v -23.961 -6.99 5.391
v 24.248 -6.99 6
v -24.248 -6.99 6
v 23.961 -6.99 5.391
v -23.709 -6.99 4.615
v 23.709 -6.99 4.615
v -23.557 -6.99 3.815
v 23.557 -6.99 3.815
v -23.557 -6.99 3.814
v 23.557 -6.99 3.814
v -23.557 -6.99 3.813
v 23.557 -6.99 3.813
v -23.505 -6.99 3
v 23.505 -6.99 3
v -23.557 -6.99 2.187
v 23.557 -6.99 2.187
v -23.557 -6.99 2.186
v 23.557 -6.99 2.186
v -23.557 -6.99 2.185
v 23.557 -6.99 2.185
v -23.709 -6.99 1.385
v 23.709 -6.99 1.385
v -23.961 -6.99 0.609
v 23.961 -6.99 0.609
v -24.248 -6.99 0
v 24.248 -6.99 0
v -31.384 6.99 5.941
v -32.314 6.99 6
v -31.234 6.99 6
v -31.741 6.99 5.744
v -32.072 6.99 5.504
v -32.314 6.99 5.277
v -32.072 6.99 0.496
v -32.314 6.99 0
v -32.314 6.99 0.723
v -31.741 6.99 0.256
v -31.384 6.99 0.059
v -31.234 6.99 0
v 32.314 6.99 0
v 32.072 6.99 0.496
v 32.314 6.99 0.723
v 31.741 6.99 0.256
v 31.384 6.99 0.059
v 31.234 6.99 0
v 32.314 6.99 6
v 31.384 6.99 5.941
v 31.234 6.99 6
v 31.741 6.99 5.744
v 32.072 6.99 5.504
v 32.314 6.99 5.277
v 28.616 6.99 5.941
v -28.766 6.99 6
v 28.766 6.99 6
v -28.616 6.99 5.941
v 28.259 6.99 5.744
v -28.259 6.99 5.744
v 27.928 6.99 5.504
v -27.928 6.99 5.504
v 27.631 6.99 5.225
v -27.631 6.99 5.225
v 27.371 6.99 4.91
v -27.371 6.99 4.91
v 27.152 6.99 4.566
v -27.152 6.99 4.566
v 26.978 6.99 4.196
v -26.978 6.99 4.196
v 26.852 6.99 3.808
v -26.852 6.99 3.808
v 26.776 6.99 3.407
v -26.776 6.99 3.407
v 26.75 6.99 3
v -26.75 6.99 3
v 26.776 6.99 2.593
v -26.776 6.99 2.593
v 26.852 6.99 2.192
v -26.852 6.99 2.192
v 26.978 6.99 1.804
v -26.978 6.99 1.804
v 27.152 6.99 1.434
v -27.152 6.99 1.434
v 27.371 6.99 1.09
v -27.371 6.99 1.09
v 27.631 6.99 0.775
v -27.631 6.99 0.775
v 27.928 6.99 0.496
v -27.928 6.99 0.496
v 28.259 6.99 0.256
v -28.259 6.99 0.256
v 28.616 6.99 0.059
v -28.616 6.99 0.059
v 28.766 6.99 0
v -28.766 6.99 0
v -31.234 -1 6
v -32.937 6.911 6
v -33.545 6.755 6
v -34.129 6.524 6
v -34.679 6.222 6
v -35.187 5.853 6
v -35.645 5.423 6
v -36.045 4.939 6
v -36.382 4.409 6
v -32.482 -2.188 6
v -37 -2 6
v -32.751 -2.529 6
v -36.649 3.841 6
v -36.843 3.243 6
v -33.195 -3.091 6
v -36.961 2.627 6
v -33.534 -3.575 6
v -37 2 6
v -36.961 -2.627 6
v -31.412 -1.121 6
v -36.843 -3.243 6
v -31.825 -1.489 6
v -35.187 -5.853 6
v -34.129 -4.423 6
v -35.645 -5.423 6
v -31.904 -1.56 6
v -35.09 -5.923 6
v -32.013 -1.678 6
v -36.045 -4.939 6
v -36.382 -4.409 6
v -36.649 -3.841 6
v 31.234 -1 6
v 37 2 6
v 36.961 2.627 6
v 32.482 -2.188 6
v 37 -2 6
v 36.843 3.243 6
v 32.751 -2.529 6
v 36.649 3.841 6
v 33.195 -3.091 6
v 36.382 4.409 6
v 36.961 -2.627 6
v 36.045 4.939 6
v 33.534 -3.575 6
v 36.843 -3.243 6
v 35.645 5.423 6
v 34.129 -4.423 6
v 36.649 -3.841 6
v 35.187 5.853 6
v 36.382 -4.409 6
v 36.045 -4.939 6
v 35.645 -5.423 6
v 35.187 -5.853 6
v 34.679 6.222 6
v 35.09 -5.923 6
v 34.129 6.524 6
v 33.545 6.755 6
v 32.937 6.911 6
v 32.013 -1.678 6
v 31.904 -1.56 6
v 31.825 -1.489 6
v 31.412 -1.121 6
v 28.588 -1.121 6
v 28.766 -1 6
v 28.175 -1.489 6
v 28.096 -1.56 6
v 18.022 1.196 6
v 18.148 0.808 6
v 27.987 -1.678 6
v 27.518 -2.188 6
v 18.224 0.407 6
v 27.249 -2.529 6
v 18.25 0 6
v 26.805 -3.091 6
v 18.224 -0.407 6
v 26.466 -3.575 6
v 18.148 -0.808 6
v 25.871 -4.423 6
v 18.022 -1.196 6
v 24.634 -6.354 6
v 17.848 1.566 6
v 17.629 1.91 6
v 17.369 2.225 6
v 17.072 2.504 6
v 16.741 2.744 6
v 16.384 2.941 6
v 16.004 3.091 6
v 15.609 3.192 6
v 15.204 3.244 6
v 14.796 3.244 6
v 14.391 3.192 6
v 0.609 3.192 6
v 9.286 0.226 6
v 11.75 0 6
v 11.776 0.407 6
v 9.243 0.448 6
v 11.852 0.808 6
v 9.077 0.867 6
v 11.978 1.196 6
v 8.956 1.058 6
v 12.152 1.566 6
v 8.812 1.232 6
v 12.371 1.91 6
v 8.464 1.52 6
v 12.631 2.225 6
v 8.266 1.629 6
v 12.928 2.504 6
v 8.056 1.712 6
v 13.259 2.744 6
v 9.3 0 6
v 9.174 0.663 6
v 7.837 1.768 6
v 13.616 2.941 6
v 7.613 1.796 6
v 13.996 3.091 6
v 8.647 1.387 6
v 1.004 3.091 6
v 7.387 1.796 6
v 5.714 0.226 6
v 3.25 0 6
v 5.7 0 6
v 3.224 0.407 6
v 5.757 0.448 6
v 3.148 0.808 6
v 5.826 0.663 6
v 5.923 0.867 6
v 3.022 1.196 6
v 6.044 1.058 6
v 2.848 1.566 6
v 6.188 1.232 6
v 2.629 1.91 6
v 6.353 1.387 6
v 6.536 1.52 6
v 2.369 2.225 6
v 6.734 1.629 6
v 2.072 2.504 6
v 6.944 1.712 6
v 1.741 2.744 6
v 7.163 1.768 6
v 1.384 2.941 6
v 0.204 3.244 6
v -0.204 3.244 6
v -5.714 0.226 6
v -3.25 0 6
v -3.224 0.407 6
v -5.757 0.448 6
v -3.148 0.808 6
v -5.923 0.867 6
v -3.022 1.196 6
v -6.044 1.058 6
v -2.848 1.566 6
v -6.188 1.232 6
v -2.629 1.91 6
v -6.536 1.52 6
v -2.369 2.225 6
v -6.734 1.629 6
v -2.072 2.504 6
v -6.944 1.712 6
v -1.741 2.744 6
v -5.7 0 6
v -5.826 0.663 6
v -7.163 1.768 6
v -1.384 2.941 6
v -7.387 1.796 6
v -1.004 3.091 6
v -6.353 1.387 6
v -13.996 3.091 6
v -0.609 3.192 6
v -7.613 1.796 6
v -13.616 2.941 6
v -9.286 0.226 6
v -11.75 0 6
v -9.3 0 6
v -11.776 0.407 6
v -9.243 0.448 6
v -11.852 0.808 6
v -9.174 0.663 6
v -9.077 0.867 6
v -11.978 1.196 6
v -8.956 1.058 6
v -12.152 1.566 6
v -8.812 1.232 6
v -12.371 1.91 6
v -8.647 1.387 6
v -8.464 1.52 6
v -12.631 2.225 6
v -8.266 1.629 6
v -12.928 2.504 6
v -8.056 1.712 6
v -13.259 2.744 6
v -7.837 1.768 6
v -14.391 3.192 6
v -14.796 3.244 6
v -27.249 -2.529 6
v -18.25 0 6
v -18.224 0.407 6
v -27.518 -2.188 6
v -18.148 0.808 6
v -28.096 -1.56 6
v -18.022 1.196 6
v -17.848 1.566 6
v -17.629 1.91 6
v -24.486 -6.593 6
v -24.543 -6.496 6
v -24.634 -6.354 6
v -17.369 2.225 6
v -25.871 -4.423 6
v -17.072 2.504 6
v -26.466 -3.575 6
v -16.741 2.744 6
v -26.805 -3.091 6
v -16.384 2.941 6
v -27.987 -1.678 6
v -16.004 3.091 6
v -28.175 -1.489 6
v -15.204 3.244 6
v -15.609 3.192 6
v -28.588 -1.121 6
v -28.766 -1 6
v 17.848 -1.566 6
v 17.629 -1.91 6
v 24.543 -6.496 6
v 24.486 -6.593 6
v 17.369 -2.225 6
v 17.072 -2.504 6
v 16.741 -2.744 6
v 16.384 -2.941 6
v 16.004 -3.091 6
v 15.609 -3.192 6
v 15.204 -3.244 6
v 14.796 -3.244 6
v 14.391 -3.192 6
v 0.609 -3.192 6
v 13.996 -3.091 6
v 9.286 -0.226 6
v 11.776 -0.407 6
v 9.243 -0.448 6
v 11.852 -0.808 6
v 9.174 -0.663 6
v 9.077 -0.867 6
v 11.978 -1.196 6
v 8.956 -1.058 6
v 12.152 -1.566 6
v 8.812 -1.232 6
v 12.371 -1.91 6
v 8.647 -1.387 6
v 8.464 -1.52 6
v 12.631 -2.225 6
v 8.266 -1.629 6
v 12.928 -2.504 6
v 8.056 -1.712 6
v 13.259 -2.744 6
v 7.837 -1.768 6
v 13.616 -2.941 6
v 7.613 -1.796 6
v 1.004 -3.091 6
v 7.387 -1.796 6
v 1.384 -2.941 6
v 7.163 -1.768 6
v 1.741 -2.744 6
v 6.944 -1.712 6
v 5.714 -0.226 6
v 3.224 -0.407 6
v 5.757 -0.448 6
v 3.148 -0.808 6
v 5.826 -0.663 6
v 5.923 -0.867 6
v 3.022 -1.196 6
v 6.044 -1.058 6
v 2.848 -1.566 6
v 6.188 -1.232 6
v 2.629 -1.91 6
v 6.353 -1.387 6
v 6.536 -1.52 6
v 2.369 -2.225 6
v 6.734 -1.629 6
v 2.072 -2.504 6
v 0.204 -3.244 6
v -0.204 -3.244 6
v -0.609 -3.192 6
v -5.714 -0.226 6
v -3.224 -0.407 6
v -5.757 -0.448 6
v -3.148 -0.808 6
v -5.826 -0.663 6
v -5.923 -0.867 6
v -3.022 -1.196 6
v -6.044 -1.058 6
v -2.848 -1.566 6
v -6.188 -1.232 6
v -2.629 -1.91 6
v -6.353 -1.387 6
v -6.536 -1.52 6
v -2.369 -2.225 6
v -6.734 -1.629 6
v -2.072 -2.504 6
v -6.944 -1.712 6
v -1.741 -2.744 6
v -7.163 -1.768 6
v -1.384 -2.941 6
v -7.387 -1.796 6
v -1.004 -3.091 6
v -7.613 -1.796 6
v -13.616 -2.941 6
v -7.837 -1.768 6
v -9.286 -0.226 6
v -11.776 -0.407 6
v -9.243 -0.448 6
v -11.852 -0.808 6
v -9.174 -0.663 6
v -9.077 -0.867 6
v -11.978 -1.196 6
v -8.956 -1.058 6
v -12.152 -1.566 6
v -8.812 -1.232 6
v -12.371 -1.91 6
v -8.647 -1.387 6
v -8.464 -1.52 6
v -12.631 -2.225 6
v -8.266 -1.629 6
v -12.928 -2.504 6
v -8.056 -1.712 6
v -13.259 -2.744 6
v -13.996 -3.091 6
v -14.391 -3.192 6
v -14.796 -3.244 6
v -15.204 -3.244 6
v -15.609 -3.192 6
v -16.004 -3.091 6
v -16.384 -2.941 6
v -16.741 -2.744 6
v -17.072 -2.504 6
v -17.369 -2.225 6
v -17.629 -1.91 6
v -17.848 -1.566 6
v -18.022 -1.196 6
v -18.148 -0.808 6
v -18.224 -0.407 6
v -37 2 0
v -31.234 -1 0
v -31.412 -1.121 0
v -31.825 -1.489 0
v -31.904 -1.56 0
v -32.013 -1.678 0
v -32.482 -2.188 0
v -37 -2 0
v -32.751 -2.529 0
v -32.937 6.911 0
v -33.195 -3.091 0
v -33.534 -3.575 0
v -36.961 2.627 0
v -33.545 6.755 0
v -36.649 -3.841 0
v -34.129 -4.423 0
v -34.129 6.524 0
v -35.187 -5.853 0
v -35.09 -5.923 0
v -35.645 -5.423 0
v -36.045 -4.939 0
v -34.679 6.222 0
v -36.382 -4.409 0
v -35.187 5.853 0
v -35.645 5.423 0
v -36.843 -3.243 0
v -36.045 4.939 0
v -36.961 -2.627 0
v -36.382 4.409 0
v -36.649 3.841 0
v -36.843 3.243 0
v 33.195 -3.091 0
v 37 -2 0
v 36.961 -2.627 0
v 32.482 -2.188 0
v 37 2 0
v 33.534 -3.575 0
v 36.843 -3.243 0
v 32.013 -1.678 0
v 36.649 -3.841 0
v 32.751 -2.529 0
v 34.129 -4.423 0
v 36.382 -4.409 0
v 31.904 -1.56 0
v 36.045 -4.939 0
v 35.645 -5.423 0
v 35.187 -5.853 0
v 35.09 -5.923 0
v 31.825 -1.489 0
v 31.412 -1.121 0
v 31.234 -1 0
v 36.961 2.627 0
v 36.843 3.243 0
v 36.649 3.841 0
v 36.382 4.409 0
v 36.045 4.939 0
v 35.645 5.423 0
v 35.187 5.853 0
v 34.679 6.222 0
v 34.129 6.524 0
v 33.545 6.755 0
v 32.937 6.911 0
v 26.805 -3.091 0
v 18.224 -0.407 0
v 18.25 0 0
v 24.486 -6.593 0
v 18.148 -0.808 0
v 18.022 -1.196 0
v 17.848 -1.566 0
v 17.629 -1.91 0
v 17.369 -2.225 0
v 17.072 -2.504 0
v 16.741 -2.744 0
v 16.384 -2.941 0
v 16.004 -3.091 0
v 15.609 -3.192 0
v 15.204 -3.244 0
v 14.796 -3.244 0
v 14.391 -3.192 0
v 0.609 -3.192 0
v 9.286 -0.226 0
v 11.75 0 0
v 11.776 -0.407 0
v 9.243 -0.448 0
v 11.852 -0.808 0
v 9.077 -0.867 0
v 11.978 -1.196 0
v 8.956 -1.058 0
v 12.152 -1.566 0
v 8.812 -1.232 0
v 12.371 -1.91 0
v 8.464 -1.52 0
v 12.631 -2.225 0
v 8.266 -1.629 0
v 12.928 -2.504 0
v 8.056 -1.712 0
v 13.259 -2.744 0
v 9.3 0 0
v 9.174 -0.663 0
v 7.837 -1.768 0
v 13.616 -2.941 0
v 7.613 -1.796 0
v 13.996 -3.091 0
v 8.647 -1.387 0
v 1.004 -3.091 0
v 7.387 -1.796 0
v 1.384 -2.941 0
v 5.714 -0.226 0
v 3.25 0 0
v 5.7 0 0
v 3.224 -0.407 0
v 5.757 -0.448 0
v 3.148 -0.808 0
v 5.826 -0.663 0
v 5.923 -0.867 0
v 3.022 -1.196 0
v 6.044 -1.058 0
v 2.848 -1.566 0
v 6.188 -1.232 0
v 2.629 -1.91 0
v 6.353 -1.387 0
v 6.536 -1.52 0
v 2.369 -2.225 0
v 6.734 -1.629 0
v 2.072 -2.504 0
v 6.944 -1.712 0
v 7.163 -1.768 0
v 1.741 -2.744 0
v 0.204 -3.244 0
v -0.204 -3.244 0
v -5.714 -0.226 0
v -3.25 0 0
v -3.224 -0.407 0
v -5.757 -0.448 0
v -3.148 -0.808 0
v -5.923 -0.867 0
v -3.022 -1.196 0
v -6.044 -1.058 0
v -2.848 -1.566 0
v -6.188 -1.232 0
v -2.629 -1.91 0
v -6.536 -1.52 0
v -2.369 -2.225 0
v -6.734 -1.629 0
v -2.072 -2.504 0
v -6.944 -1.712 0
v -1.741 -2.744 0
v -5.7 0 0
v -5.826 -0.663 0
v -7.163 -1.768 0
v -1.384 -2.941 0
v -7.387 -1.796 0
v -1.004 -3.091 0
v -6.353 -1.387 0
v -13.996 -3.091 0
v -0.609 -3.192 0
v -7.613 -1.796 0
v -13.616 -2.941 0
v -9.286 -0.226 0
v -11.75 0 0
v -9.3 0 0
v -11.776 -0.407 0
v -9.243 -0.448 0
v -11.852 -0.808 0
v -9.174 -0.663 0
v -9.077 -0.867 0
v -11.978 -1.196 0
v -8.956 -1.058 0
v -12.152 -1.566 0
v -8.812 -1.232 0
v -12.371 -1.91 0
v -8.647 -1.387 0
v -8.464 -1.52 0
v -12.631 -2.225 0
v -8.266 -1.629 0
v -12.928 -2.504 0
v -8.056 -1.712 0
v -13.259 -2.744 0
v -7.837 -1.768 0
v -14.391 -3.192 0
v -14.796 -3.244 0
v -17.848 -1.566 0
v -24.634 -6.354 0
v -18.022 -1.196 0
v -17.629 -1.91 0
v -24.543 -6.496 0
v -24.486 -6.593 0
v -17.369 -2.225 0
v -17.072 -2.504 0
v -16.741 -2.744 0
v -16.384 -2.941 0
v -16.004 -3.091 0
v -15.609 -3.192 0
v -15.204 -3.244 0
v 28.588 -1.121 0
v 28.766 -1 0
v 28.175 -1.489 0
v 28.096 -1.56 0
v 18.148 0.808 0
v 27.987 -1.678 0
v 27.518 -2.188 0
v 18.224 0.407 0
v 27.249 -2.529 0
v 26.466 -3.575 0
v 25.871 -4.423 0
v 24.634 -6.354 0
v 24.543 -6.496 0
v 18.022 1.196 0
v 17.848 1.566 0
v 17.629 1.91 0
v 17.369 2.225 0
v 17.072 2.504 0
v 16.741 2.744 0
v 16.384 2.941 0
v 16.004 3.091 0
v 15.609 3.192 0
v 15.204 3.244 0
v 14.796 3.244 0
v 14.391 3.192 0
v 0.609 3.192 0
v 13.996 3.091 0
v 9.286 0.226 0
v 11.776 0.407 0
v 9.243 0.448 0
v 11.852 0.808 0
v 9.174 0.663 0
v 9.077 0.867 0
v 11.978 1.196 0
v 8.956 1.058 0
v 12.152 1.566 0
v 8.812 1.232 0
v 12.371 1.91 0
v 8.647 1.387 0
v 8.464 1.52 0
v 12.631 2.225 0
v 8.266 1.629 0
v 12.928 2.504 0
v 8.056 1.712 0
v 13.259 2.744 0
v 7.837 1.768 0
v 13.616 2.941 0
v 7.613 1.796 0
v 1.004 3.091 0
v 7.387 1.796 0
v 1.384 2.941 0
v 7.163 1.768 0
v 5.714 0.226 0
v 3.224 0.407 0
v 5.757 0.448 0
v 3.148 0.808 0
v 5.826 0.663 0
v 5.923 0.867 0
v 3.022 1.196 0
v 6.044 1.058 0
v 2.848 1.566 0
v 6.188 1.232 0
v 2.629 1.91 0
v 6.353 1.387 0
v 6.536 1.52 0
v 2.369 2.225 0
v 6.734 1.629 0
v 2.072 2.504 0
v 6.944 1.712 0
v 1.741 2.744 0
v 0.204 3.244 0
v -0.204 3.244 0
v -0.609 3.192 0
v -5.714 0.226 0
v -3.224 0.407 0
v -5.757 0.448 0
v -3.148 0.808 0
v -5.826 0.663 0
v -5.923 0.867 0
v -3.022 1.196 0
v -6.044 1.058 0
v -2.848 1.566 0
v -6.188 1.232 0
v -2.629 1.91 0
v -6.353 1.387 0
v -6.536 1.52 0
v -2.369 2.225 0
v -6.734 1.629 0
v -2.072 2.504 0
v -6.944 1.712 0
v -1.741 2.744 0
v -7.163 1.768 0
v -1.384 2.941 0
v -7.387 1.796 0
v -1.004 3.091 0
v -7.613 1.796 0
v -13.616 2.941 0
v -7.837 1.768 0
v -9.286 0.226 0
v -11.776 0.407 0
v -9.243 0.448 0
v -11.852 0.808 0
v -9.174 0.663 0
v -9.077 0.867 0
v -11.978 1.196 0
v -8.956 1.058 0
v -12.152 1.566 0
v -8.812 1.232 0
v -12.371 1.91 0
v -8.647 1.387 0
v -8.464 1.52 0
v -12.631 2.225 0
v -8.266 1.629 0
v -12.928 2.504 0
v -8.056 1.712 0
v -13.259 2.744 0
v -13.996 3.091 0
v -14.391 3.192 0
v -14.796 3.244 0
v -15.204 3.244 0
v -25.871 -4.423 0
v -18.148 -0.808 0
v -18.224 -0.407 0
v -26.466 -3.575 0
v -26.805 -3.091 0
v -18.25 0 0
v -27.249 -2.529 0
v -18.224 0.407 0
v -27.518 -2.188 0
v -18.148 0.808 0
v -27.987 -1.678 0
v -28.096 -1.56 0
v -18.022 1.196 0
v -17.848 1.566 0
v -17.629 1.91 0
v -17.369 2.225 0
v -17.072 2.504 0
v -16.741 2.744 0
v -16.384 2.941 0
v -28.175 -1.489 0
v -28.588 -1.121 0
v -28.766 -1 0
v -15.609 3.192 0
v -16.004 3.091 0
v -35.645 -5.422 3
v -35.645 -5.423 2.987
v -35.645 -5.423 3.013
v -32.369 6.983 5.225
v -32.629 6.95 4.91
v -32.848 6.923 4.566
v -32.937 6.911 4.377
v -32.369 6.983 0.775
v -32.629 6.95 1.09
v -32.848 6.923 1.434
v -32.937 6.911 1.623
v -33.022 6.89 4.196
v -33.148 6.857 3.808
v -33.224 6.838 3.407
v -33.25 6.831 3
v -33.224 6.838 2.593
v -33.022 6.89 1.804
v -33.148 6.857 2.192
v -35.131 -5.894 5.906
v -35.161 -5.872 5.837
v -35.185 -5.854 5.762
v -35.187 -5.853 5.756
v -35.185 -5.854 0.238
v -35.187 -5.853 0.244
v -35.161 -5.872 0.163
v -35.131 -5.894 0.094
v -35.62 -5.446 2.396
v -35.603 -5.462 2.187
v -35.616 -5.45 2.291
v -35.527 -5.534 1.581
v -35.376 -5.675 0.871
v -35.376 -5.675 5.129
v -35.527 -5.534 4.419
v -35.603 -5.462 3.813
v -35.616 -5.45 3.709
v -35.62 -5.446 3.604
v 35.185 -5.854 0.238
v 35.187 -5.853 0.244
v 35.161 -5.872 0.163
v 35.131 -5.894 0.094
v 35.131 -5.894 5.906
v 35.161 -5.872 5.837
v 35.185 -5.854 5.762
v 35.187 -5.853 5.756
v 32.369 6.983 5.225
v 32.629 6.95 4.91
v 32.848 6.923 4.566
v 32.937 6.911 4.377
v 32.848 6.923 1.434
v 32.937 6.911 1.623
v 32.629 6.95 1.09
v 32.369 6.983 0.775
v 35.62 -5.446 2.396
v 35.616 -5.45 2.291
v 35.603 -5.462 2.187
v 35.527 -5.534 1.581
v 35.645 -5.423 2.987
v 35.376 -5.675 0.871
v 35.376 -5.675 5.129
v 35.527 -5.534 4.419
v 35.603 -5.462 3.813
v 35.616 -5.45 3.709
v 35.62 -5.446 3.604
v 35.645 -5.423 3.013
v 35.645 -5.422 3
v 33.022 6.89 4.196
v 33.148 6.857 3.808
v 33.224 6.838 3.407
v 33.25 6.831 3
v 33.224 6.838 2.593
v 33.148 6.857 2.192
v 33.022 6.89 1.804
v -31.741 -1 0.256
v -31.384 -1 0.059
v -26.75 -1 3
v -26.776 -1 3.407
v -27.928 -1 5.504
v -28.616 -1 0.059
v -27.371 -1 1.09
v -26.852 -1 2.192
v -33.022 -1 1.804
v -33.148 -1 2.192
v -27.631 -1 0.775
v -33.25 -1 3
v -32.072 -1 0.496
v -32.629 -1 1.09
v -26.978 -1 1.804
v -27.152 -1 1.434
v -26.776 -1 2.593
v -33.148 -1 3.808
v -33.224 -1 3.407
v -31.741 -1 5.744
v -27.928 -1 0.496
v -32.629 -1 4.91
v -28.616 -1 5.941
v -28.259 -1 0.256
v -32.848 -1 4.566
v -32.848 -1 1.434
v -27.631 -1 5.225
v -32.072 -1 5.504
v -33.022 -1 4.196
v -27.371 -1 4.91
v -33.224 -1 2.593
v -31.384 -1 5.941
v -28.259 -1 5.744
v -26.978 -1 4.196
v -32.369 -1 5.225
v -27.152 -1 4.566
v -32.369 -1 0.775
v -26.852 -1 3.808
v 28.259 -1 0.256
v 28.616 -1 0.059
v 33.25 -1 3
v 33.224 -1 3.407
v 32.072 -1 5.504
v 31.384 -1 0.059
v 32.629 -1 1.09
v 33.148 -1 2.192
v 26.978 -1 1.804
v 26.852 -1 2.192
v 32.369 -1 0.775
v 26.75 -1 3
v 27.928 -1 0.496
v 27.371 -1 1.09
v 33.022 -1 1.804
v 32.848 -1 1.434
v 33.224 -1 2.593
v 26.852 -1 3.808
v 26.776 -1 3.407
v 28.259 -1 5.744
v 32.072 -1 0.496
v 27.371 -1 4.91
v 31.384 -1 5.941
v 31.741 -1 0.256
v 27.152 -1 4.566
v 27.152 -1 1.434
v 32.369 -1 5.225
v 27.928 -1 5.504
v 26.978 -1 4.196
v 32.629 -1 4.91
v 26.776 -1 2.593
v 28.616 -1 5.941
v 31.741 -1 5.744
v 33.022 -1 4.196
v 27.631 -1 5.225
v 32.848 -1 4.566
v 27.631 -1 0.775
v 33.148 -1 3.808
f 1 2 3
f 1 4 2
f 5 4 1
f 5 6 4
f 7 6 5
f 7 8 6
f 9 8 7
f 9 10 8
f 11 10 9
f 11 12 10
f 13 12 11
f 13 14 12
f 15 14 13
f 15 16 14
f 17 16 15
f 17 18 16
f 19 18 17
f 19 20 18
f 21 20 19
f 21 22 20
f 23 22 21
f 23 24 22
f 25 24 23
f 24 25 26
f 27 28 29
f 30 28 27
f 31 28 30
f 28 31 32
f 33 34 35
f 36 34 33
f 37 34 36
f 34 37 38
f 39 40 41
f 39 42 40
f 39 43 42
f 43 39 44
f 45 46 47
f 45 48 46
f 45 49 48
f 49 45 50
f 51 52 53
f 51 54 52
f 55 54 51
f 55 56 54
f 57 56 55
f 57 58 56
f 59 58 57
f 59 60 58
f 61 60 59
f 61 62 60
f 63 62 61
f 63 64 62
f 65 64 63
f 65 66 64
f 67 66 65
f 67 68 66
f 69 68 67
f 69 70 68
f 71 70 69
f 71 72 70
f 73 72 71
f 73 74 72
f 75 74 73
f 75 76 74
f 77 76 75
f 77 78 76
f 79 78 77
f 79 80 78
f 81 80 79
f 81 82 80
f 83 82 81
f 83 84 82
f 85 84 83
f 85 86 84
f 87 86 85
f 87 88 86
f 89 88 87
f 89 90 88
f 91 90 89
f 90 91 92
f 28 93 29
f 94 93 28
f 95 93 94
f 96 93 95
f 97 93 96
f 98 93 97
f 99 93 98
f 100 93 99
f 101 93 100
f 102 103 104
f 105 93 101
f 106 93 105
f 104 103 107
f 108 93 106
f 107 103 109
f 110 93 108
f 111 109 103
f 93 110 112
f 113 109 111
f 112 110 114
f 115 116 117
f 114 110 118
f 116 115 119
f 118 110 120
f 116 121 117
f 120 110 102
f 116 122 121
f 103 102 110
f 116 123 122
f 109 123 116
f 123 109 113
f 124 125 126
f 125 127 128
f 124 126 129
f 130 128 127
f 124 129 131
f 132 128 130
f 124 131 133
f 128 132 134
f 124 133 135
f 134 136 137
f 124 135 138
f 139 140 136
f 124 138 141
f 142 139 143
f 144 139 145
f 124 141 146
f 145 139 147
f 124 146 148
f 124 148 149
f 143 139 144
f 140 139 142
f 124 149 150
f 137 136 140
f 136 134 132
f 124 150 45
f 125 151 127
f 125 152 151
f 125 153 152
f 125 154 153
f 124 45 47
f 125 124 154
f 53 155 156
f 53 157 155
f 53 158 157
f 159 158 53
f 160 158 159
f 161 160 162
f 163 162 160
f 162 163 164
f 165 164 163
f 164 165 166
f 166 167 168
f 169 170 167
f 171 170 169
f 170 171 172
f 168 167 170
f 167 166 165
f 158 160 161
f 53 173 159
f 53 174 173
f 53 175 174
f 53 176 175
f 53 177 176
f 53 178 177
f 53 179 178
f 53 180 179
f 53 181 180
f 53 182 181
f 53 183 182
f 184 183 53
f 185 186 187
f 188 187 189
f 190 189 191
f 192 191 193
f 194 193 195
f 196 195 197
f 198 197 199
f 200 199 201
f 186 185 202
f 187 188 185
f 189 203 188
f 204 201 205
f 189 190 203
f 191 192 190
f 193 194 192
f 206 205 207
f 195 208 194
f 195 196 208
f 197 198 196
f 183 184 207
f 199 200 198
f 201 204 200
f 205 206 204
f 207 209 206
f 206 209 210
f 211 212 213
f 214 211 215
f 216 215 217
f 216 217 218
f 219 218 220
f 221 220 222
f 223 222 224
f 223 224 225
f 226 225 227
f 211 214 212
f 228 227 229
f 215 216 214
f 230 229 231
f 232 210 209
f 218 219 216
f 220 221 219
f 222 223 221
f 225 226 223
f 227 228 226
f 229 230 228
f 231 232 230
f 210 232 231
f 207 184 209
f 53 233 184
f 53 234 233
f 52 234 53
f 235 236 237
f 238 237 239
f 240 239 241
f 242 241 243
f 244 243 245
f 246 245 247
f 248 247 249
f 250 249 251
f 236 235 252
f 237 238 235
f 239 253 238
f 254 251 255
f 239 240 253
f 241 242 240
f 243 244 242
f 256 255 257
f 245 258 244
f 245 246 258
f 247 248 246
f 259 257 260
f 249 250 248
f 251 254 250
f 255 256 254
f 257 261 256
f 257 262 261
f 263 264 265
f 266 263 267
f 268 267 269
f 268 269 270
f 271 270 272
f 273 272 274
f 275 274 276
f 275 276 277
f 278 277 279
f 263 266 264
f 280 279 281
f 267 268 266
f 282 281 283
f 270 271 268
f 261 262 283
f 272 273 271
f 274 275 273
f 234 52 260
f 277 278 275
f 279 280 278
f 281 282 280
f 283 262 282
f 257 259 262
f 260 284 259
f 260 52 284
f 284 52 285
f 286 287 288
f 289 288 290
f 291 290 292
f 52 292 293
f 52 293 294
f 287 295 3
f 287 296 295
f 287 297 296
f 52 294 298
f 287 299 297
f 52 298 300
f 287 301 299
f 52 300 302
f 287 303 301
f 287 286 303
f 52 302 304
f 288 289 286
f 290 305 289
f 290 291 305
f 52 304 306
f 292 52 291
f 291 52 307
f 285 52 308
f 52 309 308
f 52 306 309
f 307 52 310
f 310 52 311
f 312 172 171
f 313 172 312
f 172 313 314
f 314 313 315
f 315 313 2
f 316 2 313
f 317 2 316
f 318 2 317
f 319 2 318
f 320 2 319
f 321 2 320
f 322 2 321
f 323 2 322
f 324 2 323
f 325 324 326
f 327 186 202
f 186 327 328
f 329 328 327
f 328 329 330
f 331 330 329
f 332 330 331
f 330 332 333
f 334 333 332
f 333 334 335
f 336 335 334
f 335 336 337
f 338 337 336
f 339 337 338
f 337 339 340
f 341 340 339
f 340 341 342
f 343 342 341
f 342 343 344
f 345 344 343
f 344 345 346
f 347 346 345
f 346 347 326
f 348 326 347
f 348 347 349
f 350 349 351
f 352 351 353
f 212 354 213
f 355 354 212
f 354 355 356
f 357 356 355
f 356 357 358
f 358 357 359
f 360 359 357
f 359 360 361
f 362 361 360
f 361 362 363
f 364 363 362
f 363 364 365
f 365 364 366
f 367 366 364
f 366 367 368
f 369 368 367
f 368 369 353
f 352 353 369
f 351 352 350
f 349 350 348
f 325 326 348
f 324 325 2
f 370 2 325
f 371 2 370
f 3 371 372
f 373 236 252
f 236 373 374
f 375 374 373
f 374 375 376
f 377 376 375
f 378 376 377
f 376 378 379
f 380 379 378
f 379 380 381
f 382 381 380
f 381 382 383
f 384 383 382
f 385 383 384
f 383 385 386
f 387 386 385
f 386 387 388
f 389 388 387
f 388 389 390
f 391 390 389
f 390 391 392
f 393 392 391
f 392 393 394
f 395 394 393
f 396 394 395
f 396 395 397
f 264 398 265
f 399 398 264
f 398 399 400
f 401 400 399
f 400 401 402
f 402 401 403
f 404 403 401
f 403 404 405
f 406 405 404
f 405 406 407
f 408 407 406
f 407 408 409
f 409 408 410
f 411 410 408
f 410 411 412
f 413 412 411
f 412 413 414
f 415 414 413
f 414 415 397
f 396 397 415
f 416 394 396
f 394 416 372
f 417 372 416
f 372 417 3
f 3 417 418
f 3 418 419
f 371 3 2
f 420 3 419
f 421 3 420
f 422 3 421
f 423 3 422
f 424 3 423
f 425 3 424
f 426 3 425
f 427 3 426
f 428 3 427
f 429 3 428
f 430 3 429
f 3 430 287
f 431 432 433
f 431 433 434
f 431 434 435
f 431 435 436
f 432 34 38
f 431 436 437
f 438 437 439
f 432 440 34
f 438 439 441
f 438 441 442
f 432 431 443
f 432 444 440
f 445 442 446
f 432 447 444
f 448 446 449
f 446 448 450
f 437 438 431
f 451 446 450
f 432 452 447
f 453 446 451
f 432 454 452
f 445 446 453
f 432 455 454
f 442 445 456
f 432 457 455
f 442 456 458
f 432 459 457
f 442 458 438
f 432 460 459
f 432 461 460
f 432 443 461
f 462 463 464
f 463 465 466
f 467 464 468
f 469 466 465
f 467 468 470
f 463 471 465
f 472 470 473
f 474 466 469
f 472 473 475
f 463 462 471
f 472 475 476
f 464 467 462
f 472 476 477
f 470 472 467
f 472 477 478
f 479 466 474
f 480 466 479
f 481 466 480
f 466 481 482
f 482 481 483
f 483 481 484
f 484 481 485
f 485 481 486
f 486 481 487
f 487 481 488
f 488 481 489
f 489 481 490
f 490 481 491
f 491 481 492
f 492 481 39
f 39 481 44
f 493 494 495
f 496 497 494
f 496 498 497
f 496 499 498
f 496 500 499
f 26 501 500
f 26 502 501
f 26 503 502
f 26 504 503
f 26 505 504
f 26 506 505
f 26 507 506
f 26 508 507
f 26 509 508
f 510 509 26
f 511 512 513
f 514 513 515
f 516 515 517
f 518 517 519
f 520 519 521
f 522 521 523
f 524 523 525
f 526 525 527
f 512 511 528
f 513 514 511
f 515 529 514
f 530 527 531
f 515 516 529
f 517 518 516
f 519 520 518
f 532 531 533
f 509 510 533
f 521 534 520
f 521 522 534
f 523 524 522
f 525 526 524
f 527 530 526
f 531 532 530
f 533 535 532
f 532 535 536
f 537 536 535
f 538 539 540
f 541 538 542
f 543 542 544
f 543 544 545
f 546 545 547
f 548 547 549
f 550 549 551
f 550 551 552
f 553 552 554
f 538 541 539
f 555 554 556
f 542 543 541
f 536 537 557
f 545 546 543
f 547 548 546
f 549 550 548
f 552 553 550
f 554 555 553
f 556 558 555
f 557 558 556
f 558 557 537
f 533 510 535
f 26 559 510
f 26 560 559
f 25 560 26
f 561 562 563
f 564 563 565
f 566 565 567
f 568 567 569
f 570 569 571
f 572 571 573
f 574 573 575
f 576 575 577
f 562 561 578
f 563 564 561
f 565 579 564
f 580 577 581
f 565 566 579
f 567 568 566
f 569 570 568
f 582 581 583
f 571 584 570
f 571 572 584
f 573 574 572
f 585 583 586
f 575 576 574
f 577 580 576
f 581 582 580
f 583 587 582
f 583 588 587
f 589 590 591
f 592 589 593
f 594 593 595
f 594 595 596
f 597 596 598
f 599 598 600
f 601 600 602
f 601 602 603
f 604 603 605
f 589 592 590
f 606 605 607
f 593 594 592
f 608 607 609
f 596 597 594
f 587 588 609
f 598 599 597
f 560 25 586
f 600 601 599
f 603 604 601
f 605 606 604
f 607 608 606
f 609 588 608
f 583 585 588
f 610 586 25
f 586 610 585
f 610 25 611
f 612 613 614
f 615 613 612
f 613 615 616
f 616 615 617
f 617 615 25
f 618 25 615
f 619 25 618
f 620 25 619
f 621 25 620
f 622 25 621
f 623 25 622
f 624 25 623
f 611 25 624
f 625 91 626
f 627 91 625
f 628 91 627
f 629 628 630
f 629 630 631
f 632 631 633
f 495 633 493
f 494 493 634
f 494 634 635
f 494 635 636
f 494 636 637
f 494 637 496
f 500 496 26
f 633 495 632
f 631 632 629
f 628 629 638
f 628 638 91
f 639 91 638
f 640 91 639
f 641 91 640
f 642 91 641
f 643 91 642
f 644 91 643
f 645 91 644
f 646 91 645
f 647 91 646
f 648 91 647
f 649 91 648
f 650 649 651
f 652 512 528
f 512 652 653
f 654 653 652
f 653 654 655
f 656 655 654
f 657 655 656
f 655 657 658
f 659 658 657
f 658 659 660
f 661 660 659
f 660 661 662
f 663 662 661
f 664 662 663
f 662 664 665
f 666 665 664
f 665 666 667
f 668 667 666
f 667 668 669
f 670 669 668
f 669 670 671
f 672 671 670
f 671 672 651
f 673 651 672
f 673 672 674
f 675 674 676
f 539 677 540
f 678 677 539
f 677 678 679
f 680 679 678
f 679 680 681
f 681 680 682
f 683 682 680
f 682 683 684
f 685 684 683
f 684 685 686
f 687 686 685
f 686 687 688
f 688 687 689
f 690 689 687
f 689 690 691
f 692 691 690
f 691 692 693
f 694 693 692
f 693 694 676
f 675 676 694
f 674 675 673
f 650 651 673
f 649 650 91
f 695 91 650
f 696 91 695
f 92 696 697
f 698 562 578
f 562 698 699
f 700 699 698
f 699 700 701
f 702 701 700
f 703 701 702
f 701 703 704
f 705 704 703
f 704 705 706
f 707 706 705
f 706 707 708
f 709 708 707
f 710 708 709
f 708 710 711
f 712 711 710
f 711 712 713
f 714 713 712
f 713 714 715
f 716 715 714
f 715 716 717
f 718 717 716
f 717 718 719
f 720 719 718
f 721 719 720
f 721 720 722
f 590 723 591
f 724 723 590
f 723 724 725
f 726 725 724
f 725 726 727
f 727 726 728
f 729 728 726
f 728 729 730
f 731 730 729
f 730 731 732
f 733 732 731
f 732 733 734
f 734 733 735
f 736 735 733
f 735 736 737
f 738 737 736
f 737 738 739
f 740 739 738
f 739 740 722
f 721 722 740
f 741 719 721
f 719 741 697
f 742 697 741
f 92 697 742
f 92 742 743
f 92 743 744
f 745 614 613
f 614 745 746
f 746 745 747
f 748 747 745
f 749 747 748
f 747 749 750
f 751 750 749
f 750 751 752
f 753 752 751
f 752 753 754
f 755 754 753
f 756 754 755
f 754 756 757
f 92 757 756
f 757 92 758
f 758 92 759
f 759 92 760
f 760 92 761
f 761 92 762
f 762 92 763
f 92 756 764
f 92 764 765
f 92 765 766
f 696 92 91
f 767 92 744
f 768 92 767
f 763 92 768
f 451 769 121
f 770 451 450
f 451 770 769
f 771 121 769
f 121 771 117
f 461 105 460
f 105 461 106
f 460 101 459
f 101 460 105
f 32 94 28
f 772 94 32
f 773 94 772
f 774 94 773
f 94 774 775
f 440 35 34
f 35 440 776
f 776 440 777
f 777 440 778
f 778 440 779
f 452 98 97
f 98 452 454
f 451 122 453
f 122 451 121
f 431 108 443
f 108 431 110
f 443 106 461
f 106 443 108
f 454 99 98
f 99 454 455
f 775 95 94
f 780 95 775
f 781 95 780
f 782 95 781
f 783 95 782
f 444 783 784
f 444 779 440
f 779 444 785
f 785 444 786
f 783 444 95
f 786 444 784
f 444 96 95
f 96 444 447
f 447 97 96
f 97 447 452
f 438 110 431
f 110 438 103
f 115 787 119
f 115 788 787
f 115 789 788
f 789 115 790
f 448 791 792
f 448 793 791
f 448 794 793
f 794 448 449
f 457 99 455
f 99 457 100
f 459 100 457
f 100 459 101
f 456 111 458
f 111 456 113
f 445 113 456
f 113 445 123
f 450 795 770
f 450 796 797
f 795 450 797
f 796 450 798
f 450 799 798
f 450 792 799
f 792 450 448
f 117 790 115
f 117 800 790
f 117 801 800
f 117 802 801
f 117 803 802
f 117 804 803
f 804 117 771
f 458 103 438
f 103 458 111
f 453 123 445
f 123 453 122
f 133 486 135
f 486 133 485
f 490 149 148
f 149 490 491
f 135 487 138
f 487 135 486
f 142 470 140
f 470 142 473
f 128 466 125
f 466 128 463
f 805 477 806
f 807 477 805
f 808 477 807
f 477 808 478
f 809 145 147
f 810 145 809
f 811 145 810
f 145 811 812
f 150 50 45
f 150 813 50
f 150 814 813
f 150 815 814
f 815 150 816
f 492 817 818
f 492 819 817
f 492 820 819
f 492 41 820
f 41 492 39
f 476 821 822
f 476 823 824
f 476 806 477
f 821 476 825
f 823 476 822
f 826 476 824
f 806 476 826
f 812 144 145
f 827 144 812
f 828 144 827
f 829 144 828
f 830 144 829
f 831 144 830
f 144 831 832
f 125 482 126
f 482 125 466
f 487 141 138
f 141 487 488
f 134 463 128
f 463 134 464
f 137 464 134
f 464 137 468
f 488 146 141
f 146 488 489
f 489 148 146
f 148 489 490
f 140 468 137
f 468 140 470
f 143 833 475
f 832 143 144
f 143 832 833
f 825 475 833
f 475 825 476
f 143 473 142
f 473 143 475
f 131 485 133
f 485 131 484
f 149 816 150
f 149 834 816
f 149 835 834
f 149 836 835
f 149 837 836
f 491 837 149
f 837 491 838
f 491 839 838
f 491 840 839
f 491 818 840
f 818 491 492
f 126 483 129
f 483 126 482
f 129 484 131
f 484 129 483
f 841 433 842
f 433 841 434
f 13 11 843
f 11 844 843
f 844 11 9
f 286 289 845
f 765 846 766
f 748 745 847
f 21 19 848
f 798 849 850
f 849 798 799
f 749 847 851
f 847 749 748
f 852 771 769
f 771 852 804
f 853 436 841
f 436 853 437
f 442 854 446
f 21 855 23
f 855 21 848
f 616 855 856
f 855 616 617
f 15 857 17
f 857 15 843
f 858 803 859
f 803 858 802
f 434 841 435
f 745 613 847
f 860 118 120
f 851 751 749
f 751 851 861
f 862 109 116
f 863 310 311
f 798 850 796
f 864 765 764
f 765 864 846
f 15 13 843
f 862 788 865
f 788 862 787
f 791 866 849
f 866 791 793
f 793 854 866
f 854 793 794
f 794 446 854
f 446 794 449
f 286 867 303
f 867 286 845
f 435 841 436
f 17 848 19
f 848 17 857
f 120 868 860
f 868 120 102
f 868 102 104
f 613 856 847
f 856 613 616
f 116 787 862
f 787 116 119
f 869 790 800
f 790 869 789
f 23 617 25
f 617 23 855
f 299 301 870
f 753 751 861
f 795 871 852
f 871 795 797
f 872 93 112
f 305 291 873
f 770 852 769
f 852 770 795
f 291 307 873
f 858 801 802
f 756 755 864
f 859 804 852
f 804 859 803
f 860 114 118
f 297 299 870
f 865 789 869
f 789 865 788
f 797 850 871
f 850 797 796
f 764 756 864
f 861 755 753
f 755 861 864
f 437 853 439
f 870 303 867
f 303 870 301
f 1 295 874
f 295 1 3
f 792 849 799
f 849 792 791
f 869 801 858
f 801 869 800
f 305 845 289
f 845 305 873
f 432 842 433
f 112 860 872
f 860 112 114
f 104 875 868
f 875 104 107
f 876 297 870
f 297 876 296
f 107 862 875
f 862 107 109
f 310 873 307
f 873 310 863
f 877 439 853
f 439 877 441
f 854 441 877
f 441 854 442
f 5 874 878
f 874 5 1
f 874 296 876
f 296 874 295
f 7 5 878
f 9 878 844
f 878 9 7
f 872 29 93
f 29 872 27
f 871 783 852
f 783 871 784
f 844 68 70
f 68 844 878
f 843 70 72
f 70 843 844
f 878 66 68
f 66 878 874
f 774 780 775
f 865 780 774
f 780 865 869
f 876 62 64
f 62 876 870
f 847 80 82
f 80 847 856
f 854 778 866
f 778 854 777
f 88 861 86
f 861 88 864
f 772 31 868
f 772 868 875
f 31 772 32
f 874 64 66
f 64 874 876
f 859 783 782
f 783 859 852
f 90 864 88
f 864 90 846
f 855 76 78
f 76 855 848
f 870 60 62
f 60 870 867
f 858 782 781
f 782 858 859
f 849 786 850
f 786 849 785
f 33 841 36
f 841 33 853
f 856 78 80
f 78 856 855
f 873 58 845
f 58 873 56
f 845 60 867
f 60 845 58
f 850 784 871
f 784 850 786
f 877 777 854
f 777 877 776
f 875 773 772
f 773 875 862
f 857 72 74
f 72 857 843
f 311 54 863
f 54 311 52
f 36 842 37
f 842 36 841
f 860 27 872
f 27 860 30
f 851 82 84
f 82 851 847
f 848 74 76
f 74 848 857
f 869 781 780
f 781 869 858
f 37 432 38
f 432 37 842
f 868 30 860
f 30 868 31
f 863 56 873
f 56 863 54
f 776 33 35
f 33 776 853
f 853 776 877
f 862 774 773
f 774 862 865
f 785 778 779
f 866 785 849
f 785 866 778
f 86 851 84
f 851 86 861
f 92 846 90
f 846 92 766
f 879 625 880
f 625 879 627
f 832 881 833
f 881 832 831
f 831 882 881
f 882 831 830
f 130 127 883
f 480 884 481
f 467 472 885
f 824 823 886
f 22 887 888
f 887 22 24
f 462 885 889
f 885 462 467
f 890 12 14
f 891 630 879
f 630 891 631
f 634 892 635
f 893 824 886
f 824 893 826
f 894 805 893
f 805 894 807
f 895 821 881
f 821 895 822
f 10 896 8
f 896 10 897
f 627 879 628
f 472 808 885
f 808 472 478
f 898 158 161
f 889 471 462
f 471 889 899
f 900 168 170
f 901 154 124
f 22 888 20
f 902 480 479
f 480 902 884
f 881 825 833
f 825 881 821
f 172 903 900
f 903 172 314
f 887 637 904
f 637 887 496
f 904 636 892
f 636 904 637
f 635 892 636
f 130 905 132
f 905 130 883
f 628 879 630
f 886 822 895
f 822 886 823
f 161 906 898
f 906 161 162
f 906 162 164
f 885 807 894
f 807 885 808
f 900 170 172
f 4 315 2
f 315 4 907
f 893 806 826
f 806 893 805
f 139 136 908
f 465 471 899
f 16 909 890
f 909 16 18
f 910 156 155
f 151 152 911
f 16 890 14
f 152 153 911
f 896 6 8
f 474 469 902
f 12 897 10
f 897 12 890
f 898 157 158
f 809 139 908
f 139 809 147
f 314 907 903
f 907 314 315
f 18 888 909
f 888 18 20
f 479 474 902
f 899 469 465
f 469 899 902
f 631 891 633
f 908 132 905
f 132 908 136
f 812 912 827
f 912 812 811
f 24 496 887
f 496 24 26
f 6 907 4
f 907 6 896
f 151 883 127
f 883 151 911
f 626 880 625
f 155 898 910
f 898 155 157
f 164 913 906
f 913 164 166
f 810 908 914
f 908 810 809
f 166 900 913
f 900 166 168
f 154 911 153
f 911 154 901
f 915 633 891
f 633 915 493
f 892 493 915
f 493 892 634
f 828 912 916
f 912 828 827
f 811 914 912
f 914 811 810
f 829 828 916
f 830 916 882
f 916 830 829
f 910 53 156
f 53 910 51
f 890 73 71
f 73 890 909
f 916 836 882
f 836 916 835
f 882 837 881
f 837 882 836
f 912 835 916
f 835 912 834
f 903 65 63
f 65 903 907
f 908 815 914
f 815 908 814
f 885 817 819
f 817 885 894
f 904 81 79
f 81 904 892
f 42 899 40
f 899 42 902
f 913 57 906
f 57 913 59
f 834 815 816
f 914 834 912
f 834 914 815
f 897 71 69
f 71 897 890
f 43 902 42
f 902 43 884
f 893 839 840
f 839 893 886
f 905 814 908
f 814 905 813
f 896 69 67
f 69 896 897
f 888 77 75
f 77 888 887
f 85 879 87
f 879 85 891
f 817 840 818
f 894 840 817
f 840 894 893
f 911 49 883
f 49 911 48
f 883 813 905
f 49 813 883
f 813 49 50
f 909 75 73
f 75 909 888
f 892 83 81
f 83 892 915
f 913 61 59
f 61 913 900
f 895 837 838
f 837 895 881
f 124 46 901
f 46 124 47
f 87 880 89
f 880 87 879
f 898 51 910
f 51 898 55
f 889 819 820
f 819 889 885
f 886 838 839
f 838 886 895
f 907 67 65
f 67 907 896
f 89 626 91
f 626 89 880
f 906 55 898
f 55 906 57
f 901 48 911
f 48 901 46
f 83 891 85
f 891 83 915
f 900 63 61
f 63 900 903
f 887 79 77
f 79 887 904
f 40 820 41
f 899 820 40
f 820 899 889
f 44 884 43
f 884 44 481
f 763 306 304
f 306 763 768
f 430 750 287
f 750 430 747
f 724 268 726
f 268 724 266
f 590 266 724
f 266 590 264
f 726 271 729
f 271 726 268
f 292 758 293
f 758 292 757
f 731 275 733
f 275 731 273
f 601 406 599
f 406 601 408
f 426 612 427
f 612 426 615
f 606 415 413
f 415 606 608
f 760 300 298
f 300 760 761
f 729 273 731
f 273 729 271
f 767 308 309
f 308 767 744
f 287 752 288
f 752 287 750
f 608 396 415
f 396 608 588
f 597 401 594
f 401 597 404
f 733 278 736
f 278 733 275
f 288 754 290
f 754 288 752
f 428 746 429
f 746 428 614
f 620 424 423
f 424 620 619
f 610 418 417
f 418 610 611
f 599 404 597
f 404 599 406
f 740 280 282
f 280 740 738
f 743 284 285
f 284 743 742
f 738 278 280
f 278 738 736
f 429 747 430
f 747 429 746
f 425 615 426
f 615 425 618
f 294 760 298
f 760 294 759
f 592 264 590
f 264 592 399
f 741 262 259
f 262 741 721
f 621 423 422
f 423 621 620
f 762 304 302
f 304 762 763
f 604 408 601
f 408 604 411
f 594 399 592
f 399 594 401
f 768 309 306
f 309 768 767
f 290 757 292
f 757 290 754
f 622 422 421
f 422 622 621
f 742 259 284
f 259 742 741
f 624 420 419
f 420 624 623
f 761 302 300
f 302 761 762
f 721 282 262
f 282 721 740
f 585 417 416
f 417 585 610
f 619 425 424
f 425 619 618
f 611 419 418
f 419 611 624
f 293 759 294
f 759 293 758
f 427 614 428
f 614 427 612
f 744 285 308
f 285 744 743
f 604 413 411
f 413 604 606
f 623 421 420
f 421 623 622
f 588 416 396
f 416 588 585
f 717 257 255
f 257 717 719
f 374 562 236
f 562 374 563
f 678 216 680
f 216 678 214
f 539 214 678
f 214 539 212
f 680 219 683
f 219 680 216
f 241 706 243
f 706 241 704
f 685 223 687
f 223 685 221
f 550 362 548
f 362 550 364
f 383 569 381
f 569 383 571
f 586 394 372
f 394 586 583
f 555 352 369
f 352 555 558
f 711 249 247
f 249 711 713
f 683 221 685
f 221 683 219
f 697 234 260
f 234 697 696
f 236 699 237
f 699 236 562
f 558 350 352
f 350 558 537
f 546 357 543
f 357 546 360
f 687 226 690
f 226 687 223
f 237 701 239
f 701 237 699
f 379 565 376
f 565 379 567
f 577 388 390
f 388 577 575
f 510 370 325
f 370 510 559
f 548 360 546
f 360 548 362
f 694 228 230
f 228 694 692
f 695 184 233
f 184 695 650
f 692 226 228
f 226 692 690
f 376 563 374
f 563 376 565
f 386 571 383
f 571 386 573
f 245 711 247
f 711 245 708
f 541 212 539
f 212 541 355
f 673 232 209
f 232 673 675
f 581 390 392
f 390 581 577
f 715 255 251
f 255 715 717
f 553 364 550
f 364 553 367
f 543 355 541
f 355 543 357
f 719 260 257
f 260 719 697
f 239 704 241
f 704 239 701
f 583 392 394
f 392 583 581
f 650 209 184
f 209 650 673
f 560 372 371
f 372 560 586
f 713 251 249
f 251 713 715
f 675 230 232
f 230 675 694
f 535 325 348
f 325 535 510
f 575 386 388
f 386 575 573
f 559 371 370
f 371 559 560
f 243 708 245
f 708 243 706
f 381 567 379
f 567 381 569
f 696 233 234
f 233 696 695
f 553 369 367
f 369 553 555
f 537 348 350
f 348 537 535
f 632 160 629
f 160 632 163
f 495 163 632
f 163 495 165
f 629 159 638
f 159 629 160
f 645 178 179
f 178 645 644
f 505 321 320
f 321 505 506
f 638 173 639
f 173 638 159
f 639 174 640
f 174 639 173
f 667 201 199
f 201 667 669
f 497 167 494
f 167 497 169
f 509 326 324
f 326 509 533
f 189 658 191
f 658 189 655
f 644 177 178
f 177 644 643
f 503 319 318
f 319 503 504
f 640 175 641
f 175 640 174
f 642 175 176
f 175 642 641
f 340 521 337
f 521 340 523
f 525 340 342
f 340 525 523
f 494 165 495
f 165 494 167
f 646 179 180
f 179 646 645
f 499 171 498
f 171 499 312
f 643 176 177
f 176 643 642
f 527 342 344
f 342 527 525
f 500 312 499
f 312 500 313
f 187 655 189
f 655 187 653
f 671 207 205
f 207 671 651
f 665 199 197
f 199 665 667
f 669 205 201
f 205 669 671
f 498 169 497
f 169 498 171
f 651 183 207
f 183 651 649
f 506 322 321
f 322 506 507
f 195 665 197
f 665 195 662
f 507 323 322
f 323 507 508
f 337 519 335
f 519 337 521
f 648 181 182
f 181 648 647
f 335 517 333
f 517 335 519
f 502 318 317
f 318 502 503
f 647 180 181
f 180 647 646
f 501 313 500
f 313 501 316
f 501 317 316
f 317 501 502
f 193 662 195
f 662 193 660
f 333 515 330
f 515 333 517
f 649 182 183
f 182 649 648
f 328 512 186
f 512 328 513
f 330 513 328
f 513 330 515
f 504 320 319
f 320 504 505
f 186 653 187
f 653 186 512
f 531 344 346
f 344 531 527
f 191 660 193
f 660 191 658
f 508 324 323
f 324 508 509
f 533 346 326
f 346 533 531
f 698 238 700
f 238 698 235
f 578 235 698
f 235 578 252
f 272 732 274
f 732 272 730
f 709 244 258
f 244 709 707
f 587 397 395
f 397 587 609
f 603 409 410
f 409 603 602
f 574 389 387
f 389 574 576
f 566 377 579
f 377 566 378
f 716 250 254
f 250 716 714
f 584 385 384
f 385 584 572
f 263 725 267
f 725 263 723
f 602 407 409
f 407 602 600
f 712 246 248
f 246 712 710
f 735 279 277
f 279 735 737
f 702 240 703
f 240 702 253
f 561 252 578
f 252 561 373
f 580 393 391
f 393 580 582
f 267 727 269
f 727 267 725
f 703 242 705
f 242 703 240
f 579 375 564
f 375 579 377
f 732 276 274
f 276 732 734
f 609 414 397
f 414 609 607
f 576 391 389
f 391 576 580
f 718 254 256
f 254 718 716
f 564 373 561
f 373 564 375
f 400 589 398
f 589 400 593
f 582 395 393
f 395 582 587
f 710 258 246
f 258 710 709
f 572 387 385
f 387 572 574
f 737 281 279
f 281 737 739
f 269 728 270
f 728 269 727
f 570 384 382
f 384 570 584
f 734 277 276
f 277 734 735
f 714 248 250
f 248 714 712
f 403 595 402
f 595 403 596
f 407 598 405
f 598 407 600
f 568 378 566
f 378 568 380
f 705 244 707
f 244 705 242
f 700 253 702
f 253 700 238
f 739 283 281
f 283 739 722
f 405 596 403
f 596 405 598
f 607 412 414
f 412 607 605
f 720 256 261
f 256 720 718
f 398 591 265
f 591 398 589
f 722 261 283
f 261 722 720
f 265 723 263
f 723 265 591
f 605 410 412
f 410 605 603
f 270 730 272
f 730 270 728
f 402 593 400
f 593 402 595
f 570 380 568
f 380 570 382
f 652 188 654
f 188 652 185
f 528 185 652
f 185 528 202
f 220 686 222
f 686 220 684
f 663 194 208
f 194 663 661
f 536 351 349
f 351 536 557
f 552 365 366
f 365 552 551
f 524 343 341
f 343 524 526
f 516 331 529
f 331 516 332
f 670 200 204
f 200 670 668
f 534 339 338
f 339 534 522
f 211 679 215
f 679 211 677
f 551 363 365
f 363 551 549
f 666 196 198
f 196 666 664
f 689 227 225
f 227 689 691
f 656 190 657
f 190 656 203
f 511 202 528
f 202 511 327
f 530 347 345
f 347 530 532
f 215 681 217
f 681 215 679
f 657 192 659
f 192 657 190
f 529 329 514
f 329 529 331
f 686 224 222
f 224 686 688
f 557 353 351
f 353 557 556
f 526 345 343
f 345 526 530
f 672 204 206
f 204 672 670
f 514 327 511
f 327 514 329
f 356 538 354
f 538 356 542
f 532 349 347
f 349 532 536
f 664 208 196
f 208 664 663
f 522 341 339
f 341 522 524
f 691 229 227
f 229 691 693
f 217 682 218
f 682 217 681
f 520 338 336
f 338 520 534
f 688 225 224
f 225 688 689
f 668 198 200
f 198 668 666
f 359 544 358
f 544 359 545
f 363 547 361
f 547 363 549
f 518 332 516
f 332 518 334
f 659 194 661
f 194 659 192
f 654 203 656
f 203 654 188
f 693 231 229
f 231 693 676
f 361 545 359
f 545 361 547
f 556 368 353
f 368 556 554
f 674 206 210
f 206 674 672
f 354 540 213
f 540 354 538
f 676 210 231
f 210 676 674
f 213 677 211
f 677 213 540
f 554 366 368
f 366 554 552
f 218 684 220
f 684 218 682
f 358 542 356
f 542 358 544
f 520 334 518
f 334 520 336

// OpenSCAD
$fn = 50;


difference() {
	union() {
		hull() {
			translate(v = [-17.0000000000, 2.0000000000, 0]) {
				cylinder(h = 6, r = 5);
			}
			translate(v = [17.0000000000, 2.0000000000, 0]) {
				cylinder(h = 6, r = 5);
			}
			translate(v = [-17.0000000000, -2.0000000000, 0]) {
				cylinder(h = 6, r = 5);
			}
			translate(v = [17.0000000000, -2.0000000000, 0]) {
				cylinder(h = 6, r = 5);
			}
		}
		translate(v = [-22.5000000000, 0.0000000000, 0]) {
			hull() {
				translate(v = [-9.5000000000, 2.0000000000, 0]) {
					cylinder(h = 6, r = 5);
				}
				translate(v = [9.5000000000, 2.0000000000, 0]) {
					cylinder(h = 6, r = 5);
				}
				translate(v = [-9.5000000000, -2.0000000000, 0]) {
					cylinder(h = 6, r = 5);
				}
				translate(v = [9.5000000000, -2.0000000000, 0]) {
					cylinder(h = 6, r = 5);
				}
			}
		}
		translate(v = [-22.5000000000, 0.0000000000, 0]) {
			hull() {
				translate(v = [-9.5000000000, 2.0000000000, 0]) {
					cylinder(h = 6, r = 5);
				}
				translate(v = [9.5000000000, 2.0000000000, 0]) {
					cylinder(h = 6, r = 5);
				}
				translate(v = [-9.5000000000, -2.0000000000, 0]) {
					cylinder(h = 6, r = 5);
				}
				translate(v = [9.5000000000, -2.0000000000, 0]) {
					cylinder(h = 6, r = 5);
				}
			}
		}
		translate(v = [22.5000000000, 0.0000000000, 0]) {
			hull() {
				translate(v = [-9.5000000000, 2.0000000000, 0]) {
					cylinder(h = 6, r = 5);
				}
				translate(v = [9.5000000000, 2.0000000000, 0]) {
					cylinder(h = 6, r = 5);
				}
				translate(v = [-9.5000000000, -2.0000000000, 0]) {
					cylinder(h = 6, r = 5);
				}
				translate(v = [9.5000000000, -2.0000000000, 0]) {
					cylinder(h = 6, r = 5);
				}
			}
		}
		translate(v = [22.5000000000, 0.0000000000, 0]) {
			hull() {
				translate(v = [-9.5000000000, 2.0000000000, 0]) {
					cylinder(h = 6, r = 5);
				}
				translate(v = [9.5000000000, 2.0000000000, 0]) {
					cylinder(h = 6, r = 5);
				}
				translate(v = [-9.5000000000, -2.0000000000, 0]) {
					cylinder(h = 6, r = 5);
				}
				translate(v = [9.5000000000, -2.0000000000, 0]) {
					cylinder(h = 6, r = 5);
				}
			}
		}
	}
	union() {
		translate(v = [-30.0000000000, -7.0000000000, 3.0000000000]) {
			rotate(a = [90, 0, 0]) {
				difference() {
					union() {
						#translate(v = [0, 0, -14.0000000000]) {
							cylinder(h = 14, r = 2.2500000000);
						}
						#translate(v = [0, 0, -6]) {
							cylinder(h = 6, r1 = 3.2500000000, r2 = 6.5000000000);
						}
						#translate(v = [0, 0, -14.0000000000]) {
							cylinder(h = 14, r = 3.2500000000);
						}
						#translate(v = [0, 0, -14.0000000000]) {
							cylinder(h = 14, r = 2.2500000000);
						}
					}
					union();
				}
			}
		}
		translate(v = [30.0000000000, -7.0000000000, 3.0000000000]) {
			rotate(a = [90, 0, 0]) {
				difference() {
					union() {
						#translate(v = [0, 0, -14.0000000000]) {
							cylinder(h = 14, r = 2.2500000000);
						}
						#translate(v = [0, 0, -6]) {
							cylinder(h = 6, r1 = 3.2500000000, r2 = 6.5000000000);
						}
						#translate(v = [0, 0, -14.0000000000]) {
							cylinder(h = 14, r = 3.2500000000);
						}
						#translate(v = [0, 0, -14.0000000000]) {
							cylinder(h = 14, r = 2.2500000000);
						}
					}
					union();
				}
			}
		}
		translate(v = [-15.0000000000, 0.0000000000, 0]) {
			translate(v = [0, 0, -100]) {
				cylinder(h = 200, r = 3.2500000000);
			}
		}
		translate(v = [0, 0, -100]) {
			cylinder(h = 200, r = 3.2500000000);
		}
		translate(v = [15.0000000000, 0.0000000000, 0]) {
			translate(v = [0, 0, -100]) {
				cylinder(h = 200, r = 3.2500000000);
			}
		}
		translate(v = [-15.0000000000, 0.0000000000, 0]) {
			translate(v = [0, 0, -100]) {
				cylinder(h = 200, r = 1.8000000000);
			}
		}
		translate(v = [-7.5000000000, 0.0000000000, 0]) {
			translate(v = [0, 0, -100]) {
				cylinder(h = 200, r = 1.8000000000);
			}
		}
		translate(v = [0, 0, -100]) {
			cylinder(h = 200, r = 1.8000000000);
		}
		translate(v = [7.5000000000, 0.0000000000, 0]) {
			translate(v = [0, 0, -100]) {
				cylinder(h = 200, r = 1.8000000000);
			}
		}
		translate(v = [15.0000000000, 0.0000000000, 0]) {
			translate(v = [0, 0, -100]) {
				cylinder(h = 200, r = 1.8000000000);
			}
		}
	}
}
